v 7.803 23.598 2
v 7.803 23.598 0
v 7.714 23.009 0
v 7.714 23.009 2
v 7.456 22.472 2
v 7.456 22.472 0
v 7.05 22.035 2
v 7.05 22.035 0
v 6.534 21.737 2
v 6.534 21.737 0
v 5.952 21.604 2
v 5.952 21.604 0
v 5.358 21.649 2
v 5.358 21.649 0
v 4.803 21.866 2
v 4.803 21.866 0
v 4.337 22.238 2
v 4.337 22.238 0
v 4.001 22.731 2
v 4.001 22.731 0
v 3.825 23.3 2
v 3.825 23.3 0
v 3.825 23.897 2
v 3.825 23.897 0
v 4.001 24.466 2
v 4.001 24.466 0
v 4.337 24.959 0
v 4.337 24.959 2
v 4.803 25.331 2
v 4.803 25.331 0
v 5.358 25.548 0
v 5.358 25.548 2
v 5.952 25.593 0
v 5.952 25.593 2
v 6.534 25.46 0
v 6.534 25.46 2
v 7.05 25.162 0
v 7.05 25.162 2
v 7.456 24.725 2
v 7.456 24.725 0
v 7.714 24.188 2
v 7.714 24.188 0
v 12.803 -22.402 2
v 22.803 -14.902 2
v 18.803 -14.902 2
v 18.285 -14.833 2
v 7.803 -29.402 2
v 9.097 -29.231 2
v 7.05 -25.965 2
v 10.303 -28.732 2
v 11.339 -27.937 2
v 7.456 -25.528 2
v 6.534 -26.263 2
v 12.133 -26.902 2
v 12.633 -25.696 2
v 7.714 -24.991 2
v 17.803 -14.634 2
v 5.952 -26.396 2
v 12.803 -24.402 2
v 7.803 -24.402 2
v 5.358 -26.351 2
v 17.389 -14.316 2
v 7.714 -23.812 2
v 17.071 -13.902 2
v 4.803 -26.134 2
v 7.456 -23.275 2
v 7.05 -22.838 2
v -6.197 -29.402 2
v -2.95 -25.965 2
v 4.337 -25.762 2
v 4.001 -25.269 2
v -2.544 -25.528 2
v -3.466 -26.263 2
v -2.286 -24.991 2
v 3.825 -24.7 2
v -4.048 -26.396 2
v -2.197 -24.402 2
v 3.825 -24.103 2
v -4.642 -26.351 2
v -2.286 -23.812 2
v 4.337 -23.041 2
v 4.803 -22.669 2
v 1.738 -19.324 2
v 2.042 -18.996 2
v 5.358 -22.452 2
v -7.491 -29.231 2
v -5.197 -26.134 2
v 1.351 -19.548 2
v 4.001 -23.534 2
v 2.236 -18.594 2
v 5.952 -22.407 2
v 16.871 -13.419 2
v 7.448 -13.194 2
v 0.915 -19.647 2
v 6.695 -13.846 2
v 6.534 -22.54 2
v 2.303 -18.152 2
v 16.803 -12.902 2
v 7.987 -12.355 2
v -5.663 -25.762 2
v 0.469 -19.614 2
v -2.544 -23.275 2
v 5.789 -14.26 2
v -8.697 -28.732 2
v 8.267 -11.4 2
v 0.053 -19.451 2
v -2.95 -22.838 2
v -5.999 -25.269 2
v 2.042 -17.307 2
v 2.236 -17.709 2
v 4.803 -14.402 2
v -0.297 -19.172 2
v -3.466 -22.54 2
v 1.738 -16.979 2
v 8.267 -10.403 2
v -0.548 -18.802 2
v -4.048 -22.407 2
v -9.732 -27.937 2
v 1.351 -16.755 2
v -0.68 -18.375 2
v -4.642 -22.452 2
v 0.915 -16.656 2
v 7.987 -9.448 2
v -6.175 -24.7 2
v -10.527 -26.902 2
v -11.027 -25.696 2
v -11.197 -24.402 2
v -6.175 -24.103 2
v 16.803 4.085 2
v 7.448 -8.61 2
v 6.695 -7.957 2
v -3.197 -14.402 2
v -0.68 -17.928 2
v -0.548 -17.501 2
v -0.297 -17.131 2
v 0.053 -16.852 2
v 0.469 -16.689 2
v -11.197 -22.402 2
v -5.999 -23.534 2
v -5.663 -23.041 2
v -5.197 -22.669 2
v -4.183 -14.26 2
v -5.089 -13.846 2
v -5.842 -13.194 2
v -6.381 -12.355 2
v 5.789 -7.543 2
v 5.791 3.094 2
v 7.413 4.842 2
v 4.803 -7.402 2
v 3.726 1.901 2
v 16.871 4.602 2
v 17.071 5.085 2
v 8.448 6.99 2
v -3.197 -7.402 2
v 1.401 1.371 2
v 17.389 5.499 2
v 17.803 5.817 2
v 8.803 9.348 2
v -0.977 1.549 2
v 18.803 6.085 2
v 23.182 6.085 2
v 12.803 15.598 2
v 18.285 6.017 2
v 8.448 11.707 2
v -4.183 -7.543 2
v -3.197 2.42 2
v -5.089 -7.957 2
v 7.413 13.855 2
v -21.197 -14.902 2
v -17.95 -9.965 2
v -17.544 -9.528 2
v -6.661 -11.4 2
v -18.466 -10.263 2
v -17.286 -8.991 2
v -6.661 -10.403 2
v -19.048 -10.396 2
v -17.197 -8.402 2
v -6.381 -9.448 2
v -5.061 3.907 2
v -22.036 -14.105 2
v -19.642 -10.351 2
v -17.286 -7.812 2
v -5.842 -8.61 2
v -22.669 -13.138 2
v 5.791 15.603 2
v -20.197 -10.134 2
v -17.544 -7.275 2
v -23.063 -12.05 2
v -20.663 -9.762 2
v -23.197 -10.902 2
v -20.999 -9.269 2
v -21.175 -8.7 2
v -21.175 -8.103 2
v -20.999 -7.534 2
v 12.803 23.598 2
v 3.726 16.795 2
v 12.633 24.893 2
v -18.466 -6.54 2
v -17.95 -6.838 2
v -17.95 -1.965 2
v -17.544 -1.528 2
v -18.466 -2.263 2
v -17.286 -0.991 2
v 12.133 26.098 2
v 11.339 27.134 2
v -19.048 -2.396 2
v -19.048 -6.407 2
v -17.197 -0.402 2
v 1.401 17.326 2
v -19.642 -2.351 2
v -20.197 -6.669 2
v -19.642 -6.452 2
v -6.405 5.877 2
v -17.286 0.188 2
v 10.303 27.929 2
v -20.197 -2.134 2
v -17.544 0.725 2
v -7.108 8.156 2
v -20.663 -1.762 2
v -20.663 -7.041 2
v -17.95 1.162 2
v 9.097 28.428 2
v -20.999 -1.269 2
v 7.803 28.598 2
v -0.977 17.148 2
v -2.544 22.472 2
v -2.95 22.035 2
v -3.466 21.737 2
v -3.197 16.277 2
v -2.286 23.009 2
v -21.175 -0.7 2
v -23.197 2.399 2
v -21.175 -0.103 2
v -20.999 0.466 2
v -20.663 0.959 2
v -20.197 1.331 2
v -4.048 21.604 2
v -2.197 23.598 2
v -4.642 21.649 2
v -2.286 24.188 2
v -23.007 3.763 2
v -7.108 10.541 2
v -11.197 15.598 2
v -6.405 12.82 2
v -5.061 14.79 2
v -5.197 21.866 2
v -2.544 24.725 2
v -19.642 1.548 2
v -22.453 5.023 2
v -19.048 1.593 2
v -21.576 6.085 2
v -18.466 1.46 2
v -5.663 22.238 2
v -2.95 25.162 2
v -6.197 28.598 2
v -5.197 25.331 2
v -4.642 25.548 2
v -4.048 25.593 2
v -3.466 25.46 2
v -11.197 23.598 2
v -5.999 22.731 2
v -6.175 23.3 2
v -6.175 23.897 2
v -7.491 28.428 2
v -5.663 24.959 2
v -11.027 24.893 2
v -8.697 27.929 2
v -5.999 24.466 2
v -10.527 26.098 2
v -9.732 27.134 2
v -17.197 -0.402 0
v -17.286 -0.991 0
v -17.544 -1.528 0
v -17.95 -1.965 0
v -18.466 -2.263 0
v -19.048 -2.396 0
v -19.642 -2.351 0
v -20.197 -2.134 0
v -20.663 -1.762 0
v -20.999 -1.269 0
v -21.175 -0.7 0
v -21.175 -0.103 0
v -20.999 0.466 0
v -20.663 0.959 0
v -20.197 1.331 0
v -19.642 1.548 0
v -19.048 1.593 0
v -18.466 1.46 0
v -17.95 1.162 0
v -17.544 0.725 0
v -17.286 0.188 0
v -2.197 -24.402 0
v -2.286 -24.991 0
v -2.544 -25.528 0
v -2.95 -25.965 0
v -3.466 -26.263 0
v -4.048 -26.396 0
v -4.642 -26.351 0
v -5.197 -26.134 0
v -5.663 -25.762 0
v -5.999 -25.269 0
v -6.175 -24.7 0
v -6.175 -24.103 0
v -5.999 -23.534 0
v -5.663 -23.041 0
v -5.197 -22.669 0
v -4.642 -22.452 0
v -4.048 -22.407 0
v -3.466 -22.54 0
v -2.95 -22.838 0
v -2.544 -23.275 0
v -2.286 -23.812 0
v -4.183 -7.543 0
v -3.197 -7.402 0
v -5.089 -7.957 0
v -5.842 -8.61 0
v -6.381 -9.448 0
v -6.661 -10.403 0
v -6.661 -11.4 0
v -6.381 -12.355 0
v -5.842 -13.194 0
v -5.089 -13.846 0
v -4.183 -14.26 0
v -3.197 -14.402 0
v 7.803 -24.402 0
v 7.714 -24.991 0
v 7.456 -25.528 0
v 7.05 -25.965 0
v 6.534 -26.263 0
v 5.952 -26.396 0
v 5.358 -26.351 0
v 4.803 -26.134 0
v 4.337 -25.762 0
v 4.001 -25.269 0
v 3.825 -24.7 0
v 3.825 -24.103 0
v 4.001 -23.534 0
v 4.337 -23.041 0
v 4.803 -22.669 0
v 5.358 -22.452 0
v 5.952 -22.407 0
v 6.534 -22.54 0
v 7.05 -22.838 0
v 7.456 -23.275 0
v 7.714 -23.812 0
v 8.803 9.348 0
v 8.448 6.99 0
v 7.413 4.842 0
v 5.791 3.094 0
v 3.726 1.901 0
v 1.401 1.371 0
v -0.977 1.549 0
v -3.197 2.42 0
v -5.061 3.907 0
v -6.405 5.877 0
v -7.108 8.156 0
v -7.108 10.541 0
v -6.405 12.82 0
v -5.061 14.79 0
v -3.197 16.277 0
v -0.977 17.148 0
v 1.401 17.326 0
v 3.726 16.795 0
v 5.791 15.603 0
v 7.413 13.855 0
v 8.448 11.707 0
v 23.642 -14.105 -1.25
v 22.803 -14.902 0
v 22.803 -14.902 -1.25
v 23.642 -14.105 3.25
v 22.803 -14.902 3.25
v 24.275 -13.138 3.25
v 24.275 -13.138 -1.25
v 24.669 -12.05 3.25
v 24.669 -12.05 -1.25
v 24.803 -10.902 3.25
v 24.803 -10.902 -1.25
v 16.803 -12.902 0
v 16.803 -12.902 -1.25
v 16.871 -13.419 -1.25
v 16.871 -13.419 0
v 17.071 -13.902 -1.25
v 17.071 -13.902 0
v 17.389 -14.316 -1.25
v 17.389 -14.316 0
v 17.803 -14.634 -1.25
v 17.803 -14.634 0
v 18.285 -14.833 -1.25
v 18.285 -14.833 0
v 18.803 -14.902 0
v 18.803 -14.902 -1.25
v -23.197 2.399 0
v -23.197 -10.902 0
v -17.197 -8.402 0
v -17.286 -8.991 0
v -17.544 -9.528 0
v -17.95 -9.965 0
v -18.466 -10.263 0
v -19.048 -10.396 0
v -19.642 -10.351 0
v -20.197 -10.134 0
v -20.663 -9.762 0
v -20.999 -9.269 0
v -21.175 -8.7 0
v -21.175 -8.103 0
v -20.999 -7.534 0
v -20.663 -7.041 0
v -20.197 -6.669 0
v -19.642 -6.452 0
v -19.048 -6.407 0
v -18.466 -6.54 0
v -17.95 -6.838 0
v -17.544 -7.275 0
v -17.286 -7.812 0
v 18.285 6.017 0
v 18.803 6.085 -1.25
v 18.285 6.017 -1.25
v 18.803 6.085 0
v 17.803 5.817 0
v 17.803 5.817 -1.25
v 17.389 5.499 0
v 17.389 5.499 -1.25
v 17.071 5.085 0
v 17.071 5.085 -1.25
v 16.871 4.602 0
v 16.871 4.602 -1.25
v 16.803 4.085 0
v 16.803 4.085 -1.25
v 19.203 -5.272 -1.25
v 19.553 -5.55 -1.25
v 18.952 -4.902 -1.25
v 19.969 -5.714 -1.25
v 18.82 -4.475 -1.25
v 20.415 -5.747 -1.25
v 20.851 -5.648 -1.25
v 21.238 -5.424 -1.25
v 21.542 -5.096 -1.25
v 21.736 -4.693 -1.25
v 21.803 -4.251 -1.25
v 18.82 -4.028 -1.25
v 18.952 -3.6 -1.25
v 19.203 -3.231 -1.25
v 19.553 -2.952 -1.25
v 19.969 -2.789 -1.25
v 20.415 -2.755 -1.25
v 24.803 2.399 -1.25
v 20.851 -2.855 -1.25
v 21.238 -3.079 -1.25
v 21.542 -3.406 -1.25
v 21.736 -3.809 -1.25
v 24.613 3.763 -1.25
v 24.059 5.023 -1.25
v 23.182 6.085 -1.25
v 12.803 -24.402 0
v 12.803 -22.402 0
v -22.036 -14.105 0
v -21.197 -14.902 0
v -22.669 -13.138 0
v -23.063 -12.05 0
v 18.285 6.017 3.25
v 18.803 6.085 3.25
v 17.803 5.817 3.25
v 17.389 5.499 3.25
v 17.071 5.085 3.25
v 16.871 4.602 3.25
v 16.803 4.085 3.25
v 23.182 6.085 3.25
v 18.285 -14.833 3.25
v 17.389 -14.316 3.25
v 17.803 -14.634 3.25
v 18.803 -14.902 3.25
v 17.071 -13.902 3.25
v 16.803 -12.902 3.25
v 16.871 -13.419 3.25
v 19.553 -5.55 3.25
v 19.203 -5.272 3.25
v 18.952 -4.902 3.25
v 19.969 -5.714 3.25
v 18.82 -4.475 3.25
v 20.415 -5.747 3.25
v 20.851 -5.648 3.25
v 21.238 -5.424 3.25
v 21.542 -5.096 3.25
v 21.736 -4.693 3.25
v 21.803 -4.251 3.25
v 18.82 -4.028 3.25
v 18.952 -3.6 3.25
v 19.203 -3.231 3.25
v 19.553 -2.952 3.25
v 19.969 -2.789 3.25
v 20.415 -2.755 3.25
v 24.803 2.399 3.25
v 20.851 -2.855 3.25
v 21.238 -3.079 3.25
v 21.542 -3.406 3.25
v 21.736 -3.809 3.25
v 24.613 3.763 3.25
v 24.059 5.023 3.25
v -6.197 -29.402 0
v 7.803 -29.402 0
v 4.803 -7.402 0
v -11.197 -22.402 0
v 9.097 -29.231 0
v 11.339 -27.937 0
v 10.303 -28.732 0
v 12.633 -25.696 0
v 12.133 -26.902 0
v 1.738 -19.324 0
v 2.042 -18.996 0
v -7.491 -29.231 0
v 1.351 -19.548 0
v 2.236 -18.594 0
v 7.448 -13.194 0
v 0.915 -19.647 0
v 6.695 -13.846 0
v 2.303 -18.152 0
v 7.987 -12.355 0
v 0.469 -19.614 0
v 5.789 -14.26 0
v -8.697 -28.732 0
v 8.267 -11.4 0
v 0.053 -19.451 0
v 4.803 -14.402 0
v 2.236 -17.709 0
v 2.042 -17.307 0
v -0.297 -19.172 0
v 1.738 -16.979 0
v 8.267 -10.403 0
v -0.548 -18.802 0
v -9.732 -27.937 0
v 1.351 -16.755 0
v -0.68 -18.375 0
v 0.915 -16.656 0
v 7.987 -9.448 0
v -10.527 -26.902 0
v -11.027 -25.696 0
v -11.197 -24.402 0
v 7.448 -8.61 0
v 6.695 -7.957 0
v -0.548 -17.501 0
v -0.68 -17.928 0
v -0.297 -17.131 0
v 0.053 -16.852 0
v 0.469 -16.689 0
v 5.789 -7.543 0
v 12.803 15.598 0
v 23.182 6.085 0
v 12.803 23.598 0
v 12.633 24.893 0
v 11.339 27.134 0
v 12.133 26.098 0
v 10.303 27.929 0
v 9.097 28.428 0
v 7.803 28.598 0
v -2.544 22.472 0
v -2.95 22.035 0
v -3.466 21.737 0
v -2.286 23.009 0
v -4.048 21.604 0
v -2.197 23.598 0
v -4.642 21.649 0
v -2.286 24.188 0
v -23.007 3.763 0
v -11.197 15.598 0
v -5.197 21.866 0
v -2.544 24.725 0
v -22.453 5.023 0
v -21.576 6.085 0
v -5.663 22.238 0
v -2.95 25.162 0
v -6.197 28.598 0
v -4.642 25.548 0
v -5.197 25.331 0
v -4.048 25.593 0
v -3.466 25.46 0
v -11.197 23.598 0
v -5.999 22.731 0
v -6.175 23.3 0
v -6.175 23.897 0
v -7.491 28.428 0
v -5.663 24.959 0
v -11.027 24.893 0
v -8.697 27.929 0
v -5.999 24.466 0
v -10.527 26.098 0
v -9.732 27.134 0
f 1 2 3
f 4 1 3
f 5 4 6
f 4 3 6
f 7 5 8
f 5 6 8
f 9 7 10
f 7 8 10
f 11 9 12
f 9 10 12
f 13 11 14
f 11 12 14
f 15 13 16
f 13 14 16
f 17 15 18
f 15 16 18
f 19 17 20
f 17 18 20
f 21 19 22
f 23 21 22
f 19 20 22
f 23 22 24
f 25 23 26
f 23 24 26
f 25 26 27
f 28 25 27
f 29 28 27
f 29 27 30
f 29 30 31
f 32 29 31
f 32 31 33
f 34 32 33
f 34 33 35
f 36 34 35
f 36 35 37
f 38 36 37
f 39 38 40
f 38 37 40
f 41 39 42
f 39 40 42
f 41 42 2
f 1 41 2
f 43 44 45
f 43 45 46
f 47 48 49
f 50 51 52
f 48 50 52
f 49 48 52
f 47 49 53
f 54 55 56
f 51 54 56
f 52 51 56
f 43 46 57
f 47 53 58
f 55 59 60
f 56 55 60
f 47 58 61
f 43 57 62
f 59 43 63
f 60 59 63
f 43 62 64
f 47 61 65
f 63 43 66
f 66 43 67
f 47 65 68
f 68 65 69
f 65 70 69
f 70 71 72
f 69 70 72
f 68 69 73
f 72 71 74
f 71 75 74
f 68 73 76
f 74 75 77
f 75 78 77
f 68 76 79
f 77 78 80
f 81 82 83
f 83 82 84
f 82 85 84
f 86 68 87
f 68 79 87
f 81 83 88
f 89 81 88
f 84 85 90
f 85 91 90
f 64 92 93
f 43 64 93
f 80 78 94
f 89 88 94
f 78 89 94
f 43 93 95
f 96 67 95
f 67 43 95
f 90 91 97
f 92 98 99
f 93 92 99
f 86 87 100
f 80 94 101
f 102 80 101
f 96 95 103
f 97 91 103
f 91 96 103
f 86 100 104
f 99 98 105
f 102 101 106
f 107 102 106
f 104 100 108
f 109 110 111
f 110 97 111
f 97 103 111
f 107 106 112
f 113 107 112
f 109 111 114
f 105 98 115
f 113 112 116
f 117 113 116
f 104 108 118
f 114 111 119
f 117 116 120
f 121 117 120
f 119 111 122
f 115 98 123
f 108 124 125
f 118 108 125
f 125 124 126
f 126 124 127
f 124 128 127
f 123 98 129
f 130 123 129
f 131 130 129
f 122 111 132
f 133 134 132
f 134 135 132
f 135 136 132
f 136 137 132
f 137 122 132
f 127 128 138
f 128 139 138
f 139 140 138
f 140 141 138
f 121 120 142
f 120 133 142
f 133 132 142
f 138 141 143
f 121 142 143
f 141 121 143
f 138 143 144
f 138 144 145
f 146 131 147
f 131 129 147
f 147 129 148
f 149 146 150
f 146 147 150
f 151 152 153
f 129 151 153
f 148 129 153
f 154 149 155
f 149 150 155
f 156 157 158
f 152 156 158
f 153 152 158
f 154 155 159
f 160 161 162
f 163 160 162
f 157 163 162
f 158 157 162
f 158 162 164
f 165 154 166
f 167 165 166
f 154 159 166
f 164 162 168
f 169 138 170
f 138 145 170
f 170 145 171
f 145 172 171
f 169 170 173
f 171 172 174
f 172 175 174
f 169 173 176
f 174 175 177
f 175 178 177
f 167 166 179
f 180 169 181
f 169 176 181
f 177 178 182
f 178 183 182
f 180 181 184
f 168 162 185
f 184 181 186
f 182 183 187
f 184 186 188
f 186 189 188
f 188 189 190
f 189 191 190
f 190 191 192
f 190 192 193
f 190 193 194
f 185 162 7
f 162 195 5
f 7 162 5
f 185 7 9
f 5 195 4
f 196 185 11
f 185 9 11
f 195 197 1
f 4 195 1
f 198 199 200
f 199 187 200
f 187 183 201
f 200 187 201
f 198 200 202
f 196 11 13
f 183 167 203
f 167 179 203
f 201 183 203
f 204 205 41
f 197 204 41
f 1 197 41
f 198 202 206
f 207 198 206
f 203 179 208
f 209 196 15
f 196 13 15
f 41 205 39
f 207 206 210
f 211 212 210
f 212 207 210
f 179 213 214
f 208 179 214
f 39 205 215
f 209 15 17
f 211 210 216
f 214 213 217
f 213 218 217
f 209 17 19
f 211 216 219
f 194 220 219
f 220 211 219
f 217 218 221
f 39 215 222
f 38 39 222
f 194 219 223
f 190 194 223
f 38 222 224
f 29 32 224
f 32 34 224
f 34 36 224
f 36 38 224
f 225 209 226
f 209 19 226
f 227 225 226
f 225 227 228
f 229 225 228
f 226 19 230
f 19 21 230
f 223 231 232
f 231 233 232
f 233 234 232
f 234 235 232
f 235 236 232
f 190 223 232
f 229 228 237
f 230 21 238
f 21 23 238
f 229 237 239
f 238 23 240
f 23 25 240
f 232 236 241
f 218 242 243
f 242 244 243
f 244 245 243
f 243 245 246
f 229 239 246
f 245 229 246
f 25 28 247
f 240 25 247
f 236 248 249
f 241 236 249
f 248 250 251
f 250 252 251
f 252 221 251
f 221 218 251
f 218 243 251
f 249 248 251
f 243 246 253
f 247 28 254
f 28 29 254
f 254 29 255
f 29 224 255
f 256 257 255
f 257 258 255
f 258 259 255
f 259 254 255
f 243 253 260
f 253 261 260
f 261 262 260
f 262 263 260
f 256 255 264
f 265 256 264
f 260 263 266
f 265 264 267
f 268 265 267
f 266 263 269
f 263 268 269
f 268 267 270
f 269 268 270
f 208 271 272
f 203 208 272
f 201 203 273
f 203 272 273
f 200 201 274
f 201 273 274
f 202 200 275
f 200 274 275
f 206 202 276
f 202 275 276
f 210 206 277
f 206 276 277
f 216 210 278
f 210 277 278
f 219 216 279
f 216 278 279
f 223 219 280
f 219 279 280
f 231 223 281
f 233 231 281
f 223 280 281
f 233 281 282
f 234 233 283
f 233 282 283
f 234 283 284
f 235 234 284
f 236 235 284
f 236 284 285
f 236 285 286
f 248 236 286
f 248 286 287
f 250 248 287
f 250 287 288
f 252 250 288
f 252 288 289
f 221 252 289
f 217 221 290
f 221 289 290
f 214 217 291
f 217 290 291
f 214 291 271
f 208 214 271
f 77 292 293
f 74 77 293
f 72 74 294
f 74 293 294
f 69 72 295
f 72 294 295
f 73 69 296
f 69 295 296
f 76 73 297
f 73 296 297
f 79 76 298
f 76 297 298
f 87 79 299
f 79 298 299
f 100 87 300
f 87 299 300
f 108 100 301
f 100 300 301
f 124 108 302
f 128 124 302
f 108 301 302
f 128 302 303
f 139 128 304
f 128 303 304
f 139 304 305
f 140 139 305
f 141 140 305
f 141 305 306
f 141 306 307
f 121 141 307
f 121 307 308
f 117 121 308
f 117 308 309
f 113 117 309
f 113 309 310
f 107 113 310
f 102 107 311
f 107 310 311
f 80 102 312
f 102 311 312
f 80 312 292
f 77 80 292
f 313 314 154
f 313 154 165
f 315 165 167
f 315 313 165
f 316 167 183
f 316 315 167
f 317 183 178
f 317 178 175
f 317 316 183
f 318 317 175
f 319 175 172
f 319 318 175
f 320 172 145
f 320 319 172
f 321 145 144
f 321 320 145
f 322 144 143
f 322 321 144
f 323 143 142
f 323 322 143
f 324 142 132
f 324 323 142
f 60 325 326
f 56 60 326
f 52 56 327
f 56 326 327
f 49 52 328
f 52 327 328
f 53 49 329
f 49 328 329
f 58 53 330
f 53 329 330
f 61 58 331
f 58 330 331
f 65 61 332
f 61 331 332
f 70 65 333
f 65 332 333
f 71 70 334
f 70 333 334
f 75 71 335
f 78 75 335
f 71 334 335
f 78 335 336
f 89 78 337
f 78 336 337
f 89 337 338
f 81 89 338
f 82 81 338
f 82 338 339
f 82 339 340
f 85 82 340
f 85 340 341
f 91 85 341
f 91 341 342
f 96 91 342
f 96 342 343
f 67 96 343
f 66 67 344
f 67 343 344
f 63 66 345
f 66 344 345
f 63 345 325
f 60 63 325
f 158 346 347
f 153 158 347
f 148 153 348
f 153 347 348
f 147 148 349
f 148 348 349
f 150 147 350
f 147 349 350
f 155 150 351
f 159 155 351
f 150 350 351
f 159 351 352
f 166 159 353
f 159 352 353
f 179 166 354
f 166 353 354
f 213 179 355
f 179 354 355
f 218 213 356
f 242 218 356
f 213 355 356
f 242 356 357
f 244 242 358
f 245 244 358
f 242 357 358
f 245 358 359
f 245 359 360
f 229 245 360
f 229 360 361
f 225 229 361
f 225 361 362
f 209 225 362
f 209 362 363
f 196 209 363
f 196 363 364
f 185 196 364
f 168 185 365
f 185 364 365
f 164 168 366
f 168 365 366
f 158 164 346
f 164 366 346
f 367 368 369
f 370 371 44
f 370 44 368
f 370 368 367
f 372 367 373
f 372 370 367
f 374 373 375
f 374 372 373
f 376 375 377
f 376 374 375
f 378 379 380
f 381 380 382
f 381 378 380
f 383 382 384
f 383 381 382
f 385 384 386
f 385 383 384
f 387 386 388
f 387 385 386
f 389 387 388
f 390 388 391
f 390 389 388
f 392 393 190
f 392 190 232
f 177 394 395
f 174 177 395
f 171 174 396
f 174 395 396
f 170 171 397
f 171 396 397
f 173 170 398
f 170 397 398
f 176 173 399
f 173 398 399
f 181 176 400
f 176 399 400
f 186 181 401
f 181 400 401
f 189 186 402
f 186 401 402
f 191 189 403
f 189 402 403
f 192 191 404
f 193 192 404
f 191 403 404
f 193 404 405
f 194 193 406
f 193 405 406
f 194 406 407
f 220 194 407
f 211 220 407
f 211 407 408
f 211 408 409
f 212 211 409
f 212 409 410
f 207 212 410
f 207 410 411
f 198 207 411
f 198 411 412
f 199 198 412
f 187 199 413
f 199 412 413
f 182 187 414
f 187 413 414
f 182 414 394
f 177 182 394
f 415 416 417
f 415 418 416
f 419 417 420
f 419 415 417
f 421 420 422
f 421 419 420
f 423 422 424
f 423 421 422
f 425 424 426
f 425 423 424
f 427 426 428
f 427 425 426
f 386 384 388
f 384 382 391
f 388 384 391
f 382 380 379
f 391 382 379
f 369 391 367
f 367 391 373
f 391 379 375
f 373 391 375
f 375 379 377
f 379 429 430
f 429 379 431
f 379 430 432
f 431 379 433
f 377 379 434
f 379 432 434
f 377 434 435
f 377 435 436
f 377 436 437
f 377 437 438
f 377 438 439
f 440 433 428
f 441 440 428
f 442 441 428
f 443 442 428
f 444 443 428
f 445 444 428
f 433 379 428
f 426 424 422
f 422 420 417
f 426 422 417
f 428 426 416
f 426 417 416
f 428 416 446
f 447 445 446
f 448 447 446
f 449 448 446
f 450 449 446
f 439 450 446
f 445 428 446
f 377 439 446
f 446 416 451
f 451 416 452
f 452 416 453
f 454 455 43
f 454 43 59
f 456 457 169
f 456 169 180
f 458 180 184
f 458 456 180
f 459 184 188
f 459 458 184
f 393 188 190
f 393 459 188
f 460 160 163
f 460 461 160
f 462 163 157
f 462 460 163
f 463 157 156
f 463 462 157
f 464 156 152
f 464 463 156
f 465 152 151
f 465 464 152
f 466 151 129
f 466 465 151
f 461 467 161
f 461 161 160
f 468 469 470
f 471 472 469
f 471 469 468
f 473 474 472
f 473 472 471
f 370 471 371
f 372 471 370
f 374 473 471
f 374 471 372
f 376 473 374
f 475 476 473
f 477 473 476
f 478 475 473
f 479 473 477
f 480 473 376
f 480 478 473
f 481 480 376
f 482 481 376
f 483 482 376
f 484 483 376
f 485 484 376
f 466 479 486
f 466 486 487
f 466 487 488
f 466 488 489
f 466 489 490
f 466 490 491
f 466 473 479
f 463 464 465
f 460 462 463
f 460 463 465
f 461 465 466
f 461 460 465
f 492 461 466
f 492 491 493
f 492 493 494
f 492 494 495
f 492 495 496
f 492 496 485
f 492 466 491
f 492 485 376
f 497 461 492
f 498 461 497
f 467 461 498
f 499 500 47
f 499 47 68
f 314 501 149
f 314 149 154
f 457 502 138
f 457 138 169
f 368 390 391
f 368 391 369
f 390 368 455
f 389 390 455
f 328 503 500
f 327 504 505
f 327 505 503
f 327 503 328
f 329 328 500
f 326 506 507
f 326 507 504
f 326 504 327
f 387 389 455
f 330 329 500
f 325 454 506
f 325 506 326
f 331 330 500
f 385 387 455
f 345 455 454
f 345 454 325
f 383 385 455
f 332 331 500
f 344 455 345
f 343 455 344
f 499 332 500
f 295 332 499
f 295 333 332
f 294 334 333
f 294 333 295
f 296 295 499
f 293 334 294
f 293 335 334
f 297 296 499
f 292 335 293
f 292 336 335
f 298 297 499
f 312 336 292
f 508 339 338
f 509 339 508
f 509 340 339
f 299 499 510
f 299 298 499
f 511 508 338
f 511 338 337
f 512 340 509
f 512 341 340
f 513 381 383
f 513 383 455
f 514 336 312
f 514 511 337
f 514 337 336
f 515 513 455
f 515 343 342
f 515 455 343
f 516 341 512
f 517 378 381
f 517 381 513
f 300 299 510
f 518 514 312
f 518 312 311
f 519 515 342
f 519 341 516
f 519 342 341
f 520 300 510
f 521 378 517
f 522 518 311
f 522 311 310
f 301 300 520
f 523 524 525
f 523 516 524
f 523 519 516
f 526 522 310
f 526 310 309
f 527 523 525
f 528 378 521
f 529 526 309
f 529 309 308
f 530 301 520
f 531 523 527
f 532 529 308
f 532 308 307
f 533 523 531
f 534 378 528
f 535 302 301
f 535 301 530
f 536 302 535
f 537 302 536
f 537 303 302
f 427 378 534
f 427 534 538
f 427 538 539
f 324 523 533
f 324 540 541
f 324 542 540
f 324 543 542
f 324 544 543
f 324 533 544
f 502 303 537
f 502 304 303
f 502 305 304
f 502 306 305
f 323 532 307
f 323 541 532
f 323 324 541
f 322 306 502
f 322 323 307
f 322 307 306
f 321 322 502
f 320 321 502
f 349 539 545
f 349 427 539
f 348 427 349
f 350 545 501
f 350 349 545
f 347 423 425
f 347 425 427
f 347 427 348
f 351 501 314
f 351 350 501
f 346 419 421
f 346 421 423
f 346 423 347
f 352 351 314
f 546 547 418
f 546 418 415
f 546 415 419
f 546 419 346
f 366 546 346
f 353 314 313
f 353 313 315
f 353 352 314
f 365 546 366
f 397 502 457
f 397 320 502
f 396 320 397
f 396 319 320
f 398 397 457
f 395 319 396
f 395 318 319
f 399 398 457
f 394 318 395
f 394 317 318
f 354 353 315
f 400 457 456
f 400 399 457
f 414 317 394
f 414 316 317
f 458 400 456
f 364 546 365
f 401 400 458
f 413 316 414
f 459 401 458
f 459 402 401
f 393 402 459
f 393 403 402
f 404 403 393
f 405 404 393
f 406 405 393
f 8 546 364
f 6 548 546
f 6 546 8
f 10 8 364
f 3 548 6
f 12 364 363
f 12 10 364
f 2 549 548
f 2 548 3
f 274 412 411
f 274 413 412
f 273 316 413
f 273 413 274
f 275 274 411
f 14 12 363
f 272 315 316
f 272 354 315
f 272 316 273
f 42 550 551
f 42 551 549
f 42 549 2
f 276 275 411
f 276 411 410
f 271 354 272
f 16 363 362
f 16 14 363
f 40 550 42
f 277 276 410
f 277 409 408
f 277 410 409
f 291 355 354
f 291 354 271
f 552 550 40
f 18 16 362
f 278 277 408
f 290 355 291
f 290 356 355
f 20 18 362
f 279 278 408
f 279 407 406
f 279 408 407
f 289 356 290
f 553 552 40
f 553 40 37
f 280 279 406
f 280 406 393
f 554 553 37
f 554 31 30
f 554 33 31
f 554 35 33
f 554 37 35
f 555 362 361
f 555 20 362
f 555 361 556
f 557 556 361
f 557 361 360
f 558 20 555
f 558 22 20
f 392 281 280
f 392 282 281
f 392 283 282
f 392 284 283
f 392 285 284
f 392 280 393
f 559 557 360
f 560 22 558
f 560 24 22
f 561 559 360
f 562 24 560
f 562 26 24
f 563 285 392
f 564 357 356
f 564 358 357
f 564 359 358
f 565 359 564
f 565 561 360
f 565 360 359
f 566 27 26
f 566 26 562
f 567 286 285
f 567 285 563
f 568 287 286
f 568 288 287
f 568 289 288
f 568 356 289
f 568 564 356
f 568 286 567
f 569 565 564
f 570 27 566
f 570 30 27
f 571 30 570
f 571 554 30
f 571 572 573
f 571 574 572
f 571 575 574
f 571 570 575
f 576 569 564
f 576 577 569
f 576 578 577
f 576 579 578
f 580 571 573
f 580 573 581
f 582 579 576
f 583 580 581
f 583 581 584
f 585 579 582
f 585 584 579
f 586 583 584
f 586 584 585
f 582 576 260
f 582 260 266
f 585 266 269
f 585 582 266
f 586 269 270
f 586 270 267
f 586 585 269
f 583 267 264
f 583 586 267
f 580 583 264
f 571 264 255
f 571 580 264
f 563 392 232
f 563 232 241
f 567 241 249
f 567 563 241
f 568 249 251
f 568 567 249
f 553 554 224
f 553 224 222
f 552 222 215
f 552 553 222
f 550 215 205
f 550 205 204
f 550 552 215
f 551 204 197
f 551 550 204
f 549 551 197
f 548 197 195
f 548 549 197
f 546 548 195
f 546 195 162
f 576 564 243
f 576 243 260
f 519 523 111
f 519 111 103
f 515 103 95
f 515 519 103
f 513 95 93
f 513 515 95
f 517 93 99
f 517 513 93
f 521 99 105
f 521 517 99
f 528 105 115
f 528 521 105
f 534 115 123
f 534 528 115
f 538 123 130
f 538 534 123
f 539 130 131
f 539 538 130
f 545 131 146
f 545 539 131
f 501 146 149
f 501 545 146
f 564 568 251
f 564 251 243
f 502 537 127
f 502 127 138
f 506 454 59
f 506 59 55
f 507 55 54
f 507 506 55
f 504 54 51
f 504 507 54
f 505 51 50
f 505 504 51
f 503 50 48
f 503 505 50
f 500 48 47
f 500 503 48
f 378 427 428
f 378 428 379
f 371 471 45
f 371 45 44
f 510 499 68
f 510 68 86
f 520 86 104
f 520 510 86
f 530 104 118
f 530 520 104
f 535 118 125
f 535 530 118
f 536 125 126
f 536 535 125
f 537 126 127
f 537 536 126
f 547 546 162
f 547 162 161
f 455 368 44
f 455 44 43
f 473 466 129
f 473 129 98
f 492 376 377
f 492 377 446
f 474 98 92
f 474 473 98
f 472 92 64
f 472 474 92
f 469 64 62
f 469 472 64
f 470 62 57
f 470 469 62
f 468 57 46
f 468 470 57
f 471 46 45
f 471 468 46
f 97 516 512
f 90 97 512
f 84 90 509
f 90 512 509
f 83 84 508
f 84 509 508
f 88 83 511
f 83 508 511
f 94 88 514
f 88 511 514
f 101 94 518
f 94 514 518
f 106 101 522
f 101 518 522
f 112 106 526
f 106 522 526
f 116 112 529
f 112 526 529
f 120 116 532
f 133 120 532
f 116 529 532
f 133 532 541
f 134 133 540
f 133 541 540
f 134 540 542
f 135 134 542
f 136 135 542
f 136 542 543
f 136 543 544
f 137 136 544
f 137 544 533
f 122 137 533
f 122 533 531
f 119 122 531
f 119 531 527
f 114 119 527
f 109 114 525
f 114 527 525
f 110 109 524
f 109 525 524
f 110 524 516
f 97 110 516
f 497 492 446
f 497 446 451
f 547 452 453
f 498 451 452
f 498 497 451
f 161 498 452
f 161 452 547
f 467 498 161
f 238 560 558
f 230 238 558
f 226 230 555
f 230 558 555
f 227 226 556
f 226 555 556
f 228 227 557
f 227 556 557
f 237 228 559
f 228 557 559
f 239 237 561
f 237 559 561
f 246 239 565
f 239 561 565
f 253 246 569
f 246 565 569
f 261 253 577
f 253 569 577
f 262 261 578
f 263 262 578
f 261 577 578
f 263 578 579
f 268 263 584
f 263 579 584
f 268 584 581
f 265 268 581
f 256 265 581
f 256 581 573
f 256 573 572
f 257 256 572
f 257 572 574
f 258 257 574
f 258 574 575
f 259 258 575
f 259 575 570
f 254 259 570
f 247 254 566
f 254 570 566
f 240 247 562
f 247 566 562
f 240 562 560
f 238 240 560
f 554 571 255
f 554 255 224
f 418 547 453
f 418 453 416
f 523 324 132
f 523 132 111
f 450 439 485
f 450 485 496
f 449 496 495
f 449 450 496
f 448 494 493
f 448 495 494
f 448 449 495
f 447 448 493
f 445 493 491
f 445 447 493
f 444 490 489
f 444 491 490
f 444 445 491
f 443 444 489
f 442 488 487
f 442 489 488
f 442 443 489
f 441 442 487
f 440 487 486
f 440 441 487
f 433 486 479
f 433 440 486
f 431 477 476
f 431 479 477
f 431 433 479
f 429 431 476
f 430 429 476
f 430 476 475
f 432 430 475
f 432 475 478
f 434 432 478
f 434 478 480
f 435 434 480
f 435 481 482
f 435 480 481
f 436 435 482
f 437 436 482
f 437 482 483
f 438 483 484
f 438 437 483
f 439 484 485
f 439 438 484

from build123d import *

# Parameters (mm, degrees)
SKETCH_1_R               = 2
SKETCH_1_R_2             = 8
SKETCH_1_R_3             = 1.5
EXTRUDE_1_DEPTH          = 2
EXTRUDE_2_DEPTH          = 3.25
CUT_EXTRUDE_1_DEPTH      = 39.603141342
CUT_EXTRUDE_1_DEPTH_BACK = 39.603141342
SKETCH_3_R               = 1.5
CUT_EXTRUDE_2_DEPTH      = 2
FILLET_1_R               = 2


with BuildPart() as part:
    # 草图1 → 凸台-拉伸1 (new body)
    with BuildSketch(Plane(origin=(0, 0, 0), x_dir=(-1, 0, 0), z_dir=(0, 0, -1))):
        with BuildLine():
            Line((-12.803038101, -22.40151905), (-12.803038101, -24.40151905))
            ThreePointArc((-12.803038101, -24.40151905), (-11.338572007, -27.937052956), (-7.803038101, -29.40151905))
            Line((-7.803038101, -29.40151905), (6.196961899, -29.40151905))
            ThreePointArc((6.196961899, -29.40151905), (9.732495805, -27.937052956), (11.196961899, -24.40151905))
            Line((11.196961899, -24.40151905), (11.196961899, -22.40151905))
            Line((11.196961899, -22.40151905), (21.196961899, -14.90151905))
            ThreePointArc((21.196961899, -14.90151905), (22.669097854, -13.137587028), (23.196961899, -10.90151905))
            Line((23.196961899, -10.90151905), (23.196961899, 2.398972368))
            ThreePointArc((23.196961899, 2.398972368), (22.773702864, 4.412288573), (21.575585042, 6.084743069))
            Line((21.575585042, 6.084743069), (11.196961899, 15.59848095))
            Line((11.196961899, 15.59848095), (11.196961899, 23.59848095))
            ThreePointArc((11.196961899, 23.59848095), (9.732495805, 27.134014855), (6.196961899, 28.59848095))
            Line((6.196961899, 28.59848095), (-7.803038101, 28.59848095))
            ThreePointArc((-7.803038101, 28.59848095), (-11.338572007, 27.134014855), (-12.803038101, 23.59848095))
            Line((-12.803038101, 23.59848095), (-12.803038101, 15.59848095))
            Line((-12.803038101, 15.59848095), (-23.181661243, 6.084743069))
            ThreePointArc((-23.181661243, 6.084743069), (-24.379779065, 4.412288573), (-24.803038101, 2.398972368))
            Line((-24.803038101, 2.398972368), (-24.803038101, -10.90151905))
            ThreePointArc((-24.803038101, -10.90151905), (-24.275174056, -13.137587028), (-22.803038101, -14.90151905))
            Line((-22.803038101, -14.90151905), (-12.803038101, -22.40151905))
        make_face()
        with Locations(Location((19.196961899, -8.40151905, 0), (0, 0, 180))):
            Circle(SKETCH_1_R, mode=Mode.SUBTRACT)
        with Locations(Location((19.196961899, -0.40151905, 0), (0, 0, 180))):
            Circle(SKETCH_1_R, mode=Mode.SUBTRACT)
        with Locations(Location((4.196961899, 23.59848095, 0), (0, 0, 180))):
            Circle(SKETCH_1_R, mode=Mode.SUBTRACT)
        with Locations(Location((-5.803038101, 23.59848095, 0), (0, 0, 180))):
            Circle(SKETCH_1_R, mode=Mode.SUBTRACT)
        with Locations(Location((-0.803038101, 9.34848095, 0), (0, 0, 180))):
            Circle(SKETCH_1_R_2, mode=Mode.SUBTRACT)
        with Locations(Location((-20.803038101, -8.40151905, 0), (0, 0, 180))):
            Circle(SKETCH_1_R, mode=Mode.SUBTRACT)
        with Locations(Location((-20.803038101, -0.40151905, 0), (0, 0, 180))):
            Circle(SKETCH_1_R, mode=Mode.SUBTRACT)
        with Locations(Location((-5.803038101, -24.40151905, 0), (0, 0, 180))):
            Circle(SKETCH_1_R, mode=Mode.SUBTRACT)
        with Locations(Location((4.196961899, -24.40151905, 0), (0, 0, 180))):
            Circle(SKETCH_1_R, mode=Mode.SUBTRACT)
        with Locations(Location((-0.803038101, -18.15151905, 0), (0, 0, 180))):
            Circle(SKETCH_1_R_3, mode=Mode.SUBTRACT)
        with BuildLine():
            Line((3.196961899, -14.40151905), (-4.803038101, -14.40151905))
            ThreePointArc((-4.803038101, -14.40151905), (-8.303038101, -10.90151905), (-4.803038101, -7.40151905))
            Line((-4.803038101, -7.40151905), (3.196961899, -7.40151905))
            ThreePointArc((3.196961899, -7.40151905), (6.696961899, -10.90151905), (3.196961899, -14.40151905))
        make_face(mode=Mode.SUBTRACT)
    extrude(amount=-EXTRUDE_1_DEPTH)

    # 草图2 → 凸台-拉伸2 (add, symmetric)
    with BuildSketch(Plane.XY.offset(2)):
        with BuildLine():
            Line((23.181661243, 6.084743069), (16.803038101, 6.084743069))
            Line((16.803038101, 6.084743069), (16.803038101, -14.90151905))
            Line((16.803038101, -14.90151905), (22.803038101, -14.90151905))
            ThreePointArc((22.803038101, -14.90151905), (24.275174056, -13.137587028), (24.803038101, -10.90151905))
            Line((24.803038101, -10.90151905), (24.803038101, 2.398972368))
            ThreePointArc((24.803038101, 2.398972368), (24.379779065, 4.412288573), (23.181661243, 6.084743069))
        make_face()
    extrude(amount=EXTRUDE_2_DEPTH, both=True)

    # 草图3 → 切除-拉伸1 (cut, two sides: drawn at the far end of the back side and taken through both)
    with BuildSketch(Plane.XY.offset(2).offset(-CUT_EXTRUDE_1_DEPTH_BACK)):
        with Locations((20.303038101, -4.251273341)):
            Circle(SKETCH_3_R)
    extrude(amount=CUT_EXTRUDE_1_DEPTH + CUT_EXTRUDE_1_DEPTH_BACK, mode=Mode.SUBTRACT)

    # 草图4 → 切除-拉伸2 (cut)
    with BuildSketch(Plane.XY.offset(5.25)):
        with BuildLine():
            Line((23.181661243, 6.084743069), (16.803038101, 6.084743069))
            Line((16.803038101, 6.084743069), (16.803038101, -14.90151905))
            Line((16.803038101, -14.90151905), (22.803038101, -14.90151905))
            ThreePointArc((22.803038101, -14.90151905), (24.275174056, -13.137587028), (24.803038101, -10.90151905))
            Line((24.803038101, -10.90151905), (24.803038101, 2.398972368))
            ThreePointArc((24.803038101, 2.398972368), (24.379779065, 4.412288573), (23.181661243, 6.084743069))
        make_face()
    extrude(amount=-CUT_EXTRUDE_2_DEPTH, mode=Mode.SUBTRACT)

    # 圆角1
    fillet_1_edges = [part.edges().sort_by_distance(p)[0] for p in [
        (16.803038101, -14.90151905, 2.625),
        (16.803038101, 6.084743069, 2.625),
        (16.803038101, -14.90151905, -0.625),
        (16.803038101, 6.084743069, -0.625),
    ]]
    fillet(fillet_1_edges, radius=FILLET_1_R)


solid = part.part
